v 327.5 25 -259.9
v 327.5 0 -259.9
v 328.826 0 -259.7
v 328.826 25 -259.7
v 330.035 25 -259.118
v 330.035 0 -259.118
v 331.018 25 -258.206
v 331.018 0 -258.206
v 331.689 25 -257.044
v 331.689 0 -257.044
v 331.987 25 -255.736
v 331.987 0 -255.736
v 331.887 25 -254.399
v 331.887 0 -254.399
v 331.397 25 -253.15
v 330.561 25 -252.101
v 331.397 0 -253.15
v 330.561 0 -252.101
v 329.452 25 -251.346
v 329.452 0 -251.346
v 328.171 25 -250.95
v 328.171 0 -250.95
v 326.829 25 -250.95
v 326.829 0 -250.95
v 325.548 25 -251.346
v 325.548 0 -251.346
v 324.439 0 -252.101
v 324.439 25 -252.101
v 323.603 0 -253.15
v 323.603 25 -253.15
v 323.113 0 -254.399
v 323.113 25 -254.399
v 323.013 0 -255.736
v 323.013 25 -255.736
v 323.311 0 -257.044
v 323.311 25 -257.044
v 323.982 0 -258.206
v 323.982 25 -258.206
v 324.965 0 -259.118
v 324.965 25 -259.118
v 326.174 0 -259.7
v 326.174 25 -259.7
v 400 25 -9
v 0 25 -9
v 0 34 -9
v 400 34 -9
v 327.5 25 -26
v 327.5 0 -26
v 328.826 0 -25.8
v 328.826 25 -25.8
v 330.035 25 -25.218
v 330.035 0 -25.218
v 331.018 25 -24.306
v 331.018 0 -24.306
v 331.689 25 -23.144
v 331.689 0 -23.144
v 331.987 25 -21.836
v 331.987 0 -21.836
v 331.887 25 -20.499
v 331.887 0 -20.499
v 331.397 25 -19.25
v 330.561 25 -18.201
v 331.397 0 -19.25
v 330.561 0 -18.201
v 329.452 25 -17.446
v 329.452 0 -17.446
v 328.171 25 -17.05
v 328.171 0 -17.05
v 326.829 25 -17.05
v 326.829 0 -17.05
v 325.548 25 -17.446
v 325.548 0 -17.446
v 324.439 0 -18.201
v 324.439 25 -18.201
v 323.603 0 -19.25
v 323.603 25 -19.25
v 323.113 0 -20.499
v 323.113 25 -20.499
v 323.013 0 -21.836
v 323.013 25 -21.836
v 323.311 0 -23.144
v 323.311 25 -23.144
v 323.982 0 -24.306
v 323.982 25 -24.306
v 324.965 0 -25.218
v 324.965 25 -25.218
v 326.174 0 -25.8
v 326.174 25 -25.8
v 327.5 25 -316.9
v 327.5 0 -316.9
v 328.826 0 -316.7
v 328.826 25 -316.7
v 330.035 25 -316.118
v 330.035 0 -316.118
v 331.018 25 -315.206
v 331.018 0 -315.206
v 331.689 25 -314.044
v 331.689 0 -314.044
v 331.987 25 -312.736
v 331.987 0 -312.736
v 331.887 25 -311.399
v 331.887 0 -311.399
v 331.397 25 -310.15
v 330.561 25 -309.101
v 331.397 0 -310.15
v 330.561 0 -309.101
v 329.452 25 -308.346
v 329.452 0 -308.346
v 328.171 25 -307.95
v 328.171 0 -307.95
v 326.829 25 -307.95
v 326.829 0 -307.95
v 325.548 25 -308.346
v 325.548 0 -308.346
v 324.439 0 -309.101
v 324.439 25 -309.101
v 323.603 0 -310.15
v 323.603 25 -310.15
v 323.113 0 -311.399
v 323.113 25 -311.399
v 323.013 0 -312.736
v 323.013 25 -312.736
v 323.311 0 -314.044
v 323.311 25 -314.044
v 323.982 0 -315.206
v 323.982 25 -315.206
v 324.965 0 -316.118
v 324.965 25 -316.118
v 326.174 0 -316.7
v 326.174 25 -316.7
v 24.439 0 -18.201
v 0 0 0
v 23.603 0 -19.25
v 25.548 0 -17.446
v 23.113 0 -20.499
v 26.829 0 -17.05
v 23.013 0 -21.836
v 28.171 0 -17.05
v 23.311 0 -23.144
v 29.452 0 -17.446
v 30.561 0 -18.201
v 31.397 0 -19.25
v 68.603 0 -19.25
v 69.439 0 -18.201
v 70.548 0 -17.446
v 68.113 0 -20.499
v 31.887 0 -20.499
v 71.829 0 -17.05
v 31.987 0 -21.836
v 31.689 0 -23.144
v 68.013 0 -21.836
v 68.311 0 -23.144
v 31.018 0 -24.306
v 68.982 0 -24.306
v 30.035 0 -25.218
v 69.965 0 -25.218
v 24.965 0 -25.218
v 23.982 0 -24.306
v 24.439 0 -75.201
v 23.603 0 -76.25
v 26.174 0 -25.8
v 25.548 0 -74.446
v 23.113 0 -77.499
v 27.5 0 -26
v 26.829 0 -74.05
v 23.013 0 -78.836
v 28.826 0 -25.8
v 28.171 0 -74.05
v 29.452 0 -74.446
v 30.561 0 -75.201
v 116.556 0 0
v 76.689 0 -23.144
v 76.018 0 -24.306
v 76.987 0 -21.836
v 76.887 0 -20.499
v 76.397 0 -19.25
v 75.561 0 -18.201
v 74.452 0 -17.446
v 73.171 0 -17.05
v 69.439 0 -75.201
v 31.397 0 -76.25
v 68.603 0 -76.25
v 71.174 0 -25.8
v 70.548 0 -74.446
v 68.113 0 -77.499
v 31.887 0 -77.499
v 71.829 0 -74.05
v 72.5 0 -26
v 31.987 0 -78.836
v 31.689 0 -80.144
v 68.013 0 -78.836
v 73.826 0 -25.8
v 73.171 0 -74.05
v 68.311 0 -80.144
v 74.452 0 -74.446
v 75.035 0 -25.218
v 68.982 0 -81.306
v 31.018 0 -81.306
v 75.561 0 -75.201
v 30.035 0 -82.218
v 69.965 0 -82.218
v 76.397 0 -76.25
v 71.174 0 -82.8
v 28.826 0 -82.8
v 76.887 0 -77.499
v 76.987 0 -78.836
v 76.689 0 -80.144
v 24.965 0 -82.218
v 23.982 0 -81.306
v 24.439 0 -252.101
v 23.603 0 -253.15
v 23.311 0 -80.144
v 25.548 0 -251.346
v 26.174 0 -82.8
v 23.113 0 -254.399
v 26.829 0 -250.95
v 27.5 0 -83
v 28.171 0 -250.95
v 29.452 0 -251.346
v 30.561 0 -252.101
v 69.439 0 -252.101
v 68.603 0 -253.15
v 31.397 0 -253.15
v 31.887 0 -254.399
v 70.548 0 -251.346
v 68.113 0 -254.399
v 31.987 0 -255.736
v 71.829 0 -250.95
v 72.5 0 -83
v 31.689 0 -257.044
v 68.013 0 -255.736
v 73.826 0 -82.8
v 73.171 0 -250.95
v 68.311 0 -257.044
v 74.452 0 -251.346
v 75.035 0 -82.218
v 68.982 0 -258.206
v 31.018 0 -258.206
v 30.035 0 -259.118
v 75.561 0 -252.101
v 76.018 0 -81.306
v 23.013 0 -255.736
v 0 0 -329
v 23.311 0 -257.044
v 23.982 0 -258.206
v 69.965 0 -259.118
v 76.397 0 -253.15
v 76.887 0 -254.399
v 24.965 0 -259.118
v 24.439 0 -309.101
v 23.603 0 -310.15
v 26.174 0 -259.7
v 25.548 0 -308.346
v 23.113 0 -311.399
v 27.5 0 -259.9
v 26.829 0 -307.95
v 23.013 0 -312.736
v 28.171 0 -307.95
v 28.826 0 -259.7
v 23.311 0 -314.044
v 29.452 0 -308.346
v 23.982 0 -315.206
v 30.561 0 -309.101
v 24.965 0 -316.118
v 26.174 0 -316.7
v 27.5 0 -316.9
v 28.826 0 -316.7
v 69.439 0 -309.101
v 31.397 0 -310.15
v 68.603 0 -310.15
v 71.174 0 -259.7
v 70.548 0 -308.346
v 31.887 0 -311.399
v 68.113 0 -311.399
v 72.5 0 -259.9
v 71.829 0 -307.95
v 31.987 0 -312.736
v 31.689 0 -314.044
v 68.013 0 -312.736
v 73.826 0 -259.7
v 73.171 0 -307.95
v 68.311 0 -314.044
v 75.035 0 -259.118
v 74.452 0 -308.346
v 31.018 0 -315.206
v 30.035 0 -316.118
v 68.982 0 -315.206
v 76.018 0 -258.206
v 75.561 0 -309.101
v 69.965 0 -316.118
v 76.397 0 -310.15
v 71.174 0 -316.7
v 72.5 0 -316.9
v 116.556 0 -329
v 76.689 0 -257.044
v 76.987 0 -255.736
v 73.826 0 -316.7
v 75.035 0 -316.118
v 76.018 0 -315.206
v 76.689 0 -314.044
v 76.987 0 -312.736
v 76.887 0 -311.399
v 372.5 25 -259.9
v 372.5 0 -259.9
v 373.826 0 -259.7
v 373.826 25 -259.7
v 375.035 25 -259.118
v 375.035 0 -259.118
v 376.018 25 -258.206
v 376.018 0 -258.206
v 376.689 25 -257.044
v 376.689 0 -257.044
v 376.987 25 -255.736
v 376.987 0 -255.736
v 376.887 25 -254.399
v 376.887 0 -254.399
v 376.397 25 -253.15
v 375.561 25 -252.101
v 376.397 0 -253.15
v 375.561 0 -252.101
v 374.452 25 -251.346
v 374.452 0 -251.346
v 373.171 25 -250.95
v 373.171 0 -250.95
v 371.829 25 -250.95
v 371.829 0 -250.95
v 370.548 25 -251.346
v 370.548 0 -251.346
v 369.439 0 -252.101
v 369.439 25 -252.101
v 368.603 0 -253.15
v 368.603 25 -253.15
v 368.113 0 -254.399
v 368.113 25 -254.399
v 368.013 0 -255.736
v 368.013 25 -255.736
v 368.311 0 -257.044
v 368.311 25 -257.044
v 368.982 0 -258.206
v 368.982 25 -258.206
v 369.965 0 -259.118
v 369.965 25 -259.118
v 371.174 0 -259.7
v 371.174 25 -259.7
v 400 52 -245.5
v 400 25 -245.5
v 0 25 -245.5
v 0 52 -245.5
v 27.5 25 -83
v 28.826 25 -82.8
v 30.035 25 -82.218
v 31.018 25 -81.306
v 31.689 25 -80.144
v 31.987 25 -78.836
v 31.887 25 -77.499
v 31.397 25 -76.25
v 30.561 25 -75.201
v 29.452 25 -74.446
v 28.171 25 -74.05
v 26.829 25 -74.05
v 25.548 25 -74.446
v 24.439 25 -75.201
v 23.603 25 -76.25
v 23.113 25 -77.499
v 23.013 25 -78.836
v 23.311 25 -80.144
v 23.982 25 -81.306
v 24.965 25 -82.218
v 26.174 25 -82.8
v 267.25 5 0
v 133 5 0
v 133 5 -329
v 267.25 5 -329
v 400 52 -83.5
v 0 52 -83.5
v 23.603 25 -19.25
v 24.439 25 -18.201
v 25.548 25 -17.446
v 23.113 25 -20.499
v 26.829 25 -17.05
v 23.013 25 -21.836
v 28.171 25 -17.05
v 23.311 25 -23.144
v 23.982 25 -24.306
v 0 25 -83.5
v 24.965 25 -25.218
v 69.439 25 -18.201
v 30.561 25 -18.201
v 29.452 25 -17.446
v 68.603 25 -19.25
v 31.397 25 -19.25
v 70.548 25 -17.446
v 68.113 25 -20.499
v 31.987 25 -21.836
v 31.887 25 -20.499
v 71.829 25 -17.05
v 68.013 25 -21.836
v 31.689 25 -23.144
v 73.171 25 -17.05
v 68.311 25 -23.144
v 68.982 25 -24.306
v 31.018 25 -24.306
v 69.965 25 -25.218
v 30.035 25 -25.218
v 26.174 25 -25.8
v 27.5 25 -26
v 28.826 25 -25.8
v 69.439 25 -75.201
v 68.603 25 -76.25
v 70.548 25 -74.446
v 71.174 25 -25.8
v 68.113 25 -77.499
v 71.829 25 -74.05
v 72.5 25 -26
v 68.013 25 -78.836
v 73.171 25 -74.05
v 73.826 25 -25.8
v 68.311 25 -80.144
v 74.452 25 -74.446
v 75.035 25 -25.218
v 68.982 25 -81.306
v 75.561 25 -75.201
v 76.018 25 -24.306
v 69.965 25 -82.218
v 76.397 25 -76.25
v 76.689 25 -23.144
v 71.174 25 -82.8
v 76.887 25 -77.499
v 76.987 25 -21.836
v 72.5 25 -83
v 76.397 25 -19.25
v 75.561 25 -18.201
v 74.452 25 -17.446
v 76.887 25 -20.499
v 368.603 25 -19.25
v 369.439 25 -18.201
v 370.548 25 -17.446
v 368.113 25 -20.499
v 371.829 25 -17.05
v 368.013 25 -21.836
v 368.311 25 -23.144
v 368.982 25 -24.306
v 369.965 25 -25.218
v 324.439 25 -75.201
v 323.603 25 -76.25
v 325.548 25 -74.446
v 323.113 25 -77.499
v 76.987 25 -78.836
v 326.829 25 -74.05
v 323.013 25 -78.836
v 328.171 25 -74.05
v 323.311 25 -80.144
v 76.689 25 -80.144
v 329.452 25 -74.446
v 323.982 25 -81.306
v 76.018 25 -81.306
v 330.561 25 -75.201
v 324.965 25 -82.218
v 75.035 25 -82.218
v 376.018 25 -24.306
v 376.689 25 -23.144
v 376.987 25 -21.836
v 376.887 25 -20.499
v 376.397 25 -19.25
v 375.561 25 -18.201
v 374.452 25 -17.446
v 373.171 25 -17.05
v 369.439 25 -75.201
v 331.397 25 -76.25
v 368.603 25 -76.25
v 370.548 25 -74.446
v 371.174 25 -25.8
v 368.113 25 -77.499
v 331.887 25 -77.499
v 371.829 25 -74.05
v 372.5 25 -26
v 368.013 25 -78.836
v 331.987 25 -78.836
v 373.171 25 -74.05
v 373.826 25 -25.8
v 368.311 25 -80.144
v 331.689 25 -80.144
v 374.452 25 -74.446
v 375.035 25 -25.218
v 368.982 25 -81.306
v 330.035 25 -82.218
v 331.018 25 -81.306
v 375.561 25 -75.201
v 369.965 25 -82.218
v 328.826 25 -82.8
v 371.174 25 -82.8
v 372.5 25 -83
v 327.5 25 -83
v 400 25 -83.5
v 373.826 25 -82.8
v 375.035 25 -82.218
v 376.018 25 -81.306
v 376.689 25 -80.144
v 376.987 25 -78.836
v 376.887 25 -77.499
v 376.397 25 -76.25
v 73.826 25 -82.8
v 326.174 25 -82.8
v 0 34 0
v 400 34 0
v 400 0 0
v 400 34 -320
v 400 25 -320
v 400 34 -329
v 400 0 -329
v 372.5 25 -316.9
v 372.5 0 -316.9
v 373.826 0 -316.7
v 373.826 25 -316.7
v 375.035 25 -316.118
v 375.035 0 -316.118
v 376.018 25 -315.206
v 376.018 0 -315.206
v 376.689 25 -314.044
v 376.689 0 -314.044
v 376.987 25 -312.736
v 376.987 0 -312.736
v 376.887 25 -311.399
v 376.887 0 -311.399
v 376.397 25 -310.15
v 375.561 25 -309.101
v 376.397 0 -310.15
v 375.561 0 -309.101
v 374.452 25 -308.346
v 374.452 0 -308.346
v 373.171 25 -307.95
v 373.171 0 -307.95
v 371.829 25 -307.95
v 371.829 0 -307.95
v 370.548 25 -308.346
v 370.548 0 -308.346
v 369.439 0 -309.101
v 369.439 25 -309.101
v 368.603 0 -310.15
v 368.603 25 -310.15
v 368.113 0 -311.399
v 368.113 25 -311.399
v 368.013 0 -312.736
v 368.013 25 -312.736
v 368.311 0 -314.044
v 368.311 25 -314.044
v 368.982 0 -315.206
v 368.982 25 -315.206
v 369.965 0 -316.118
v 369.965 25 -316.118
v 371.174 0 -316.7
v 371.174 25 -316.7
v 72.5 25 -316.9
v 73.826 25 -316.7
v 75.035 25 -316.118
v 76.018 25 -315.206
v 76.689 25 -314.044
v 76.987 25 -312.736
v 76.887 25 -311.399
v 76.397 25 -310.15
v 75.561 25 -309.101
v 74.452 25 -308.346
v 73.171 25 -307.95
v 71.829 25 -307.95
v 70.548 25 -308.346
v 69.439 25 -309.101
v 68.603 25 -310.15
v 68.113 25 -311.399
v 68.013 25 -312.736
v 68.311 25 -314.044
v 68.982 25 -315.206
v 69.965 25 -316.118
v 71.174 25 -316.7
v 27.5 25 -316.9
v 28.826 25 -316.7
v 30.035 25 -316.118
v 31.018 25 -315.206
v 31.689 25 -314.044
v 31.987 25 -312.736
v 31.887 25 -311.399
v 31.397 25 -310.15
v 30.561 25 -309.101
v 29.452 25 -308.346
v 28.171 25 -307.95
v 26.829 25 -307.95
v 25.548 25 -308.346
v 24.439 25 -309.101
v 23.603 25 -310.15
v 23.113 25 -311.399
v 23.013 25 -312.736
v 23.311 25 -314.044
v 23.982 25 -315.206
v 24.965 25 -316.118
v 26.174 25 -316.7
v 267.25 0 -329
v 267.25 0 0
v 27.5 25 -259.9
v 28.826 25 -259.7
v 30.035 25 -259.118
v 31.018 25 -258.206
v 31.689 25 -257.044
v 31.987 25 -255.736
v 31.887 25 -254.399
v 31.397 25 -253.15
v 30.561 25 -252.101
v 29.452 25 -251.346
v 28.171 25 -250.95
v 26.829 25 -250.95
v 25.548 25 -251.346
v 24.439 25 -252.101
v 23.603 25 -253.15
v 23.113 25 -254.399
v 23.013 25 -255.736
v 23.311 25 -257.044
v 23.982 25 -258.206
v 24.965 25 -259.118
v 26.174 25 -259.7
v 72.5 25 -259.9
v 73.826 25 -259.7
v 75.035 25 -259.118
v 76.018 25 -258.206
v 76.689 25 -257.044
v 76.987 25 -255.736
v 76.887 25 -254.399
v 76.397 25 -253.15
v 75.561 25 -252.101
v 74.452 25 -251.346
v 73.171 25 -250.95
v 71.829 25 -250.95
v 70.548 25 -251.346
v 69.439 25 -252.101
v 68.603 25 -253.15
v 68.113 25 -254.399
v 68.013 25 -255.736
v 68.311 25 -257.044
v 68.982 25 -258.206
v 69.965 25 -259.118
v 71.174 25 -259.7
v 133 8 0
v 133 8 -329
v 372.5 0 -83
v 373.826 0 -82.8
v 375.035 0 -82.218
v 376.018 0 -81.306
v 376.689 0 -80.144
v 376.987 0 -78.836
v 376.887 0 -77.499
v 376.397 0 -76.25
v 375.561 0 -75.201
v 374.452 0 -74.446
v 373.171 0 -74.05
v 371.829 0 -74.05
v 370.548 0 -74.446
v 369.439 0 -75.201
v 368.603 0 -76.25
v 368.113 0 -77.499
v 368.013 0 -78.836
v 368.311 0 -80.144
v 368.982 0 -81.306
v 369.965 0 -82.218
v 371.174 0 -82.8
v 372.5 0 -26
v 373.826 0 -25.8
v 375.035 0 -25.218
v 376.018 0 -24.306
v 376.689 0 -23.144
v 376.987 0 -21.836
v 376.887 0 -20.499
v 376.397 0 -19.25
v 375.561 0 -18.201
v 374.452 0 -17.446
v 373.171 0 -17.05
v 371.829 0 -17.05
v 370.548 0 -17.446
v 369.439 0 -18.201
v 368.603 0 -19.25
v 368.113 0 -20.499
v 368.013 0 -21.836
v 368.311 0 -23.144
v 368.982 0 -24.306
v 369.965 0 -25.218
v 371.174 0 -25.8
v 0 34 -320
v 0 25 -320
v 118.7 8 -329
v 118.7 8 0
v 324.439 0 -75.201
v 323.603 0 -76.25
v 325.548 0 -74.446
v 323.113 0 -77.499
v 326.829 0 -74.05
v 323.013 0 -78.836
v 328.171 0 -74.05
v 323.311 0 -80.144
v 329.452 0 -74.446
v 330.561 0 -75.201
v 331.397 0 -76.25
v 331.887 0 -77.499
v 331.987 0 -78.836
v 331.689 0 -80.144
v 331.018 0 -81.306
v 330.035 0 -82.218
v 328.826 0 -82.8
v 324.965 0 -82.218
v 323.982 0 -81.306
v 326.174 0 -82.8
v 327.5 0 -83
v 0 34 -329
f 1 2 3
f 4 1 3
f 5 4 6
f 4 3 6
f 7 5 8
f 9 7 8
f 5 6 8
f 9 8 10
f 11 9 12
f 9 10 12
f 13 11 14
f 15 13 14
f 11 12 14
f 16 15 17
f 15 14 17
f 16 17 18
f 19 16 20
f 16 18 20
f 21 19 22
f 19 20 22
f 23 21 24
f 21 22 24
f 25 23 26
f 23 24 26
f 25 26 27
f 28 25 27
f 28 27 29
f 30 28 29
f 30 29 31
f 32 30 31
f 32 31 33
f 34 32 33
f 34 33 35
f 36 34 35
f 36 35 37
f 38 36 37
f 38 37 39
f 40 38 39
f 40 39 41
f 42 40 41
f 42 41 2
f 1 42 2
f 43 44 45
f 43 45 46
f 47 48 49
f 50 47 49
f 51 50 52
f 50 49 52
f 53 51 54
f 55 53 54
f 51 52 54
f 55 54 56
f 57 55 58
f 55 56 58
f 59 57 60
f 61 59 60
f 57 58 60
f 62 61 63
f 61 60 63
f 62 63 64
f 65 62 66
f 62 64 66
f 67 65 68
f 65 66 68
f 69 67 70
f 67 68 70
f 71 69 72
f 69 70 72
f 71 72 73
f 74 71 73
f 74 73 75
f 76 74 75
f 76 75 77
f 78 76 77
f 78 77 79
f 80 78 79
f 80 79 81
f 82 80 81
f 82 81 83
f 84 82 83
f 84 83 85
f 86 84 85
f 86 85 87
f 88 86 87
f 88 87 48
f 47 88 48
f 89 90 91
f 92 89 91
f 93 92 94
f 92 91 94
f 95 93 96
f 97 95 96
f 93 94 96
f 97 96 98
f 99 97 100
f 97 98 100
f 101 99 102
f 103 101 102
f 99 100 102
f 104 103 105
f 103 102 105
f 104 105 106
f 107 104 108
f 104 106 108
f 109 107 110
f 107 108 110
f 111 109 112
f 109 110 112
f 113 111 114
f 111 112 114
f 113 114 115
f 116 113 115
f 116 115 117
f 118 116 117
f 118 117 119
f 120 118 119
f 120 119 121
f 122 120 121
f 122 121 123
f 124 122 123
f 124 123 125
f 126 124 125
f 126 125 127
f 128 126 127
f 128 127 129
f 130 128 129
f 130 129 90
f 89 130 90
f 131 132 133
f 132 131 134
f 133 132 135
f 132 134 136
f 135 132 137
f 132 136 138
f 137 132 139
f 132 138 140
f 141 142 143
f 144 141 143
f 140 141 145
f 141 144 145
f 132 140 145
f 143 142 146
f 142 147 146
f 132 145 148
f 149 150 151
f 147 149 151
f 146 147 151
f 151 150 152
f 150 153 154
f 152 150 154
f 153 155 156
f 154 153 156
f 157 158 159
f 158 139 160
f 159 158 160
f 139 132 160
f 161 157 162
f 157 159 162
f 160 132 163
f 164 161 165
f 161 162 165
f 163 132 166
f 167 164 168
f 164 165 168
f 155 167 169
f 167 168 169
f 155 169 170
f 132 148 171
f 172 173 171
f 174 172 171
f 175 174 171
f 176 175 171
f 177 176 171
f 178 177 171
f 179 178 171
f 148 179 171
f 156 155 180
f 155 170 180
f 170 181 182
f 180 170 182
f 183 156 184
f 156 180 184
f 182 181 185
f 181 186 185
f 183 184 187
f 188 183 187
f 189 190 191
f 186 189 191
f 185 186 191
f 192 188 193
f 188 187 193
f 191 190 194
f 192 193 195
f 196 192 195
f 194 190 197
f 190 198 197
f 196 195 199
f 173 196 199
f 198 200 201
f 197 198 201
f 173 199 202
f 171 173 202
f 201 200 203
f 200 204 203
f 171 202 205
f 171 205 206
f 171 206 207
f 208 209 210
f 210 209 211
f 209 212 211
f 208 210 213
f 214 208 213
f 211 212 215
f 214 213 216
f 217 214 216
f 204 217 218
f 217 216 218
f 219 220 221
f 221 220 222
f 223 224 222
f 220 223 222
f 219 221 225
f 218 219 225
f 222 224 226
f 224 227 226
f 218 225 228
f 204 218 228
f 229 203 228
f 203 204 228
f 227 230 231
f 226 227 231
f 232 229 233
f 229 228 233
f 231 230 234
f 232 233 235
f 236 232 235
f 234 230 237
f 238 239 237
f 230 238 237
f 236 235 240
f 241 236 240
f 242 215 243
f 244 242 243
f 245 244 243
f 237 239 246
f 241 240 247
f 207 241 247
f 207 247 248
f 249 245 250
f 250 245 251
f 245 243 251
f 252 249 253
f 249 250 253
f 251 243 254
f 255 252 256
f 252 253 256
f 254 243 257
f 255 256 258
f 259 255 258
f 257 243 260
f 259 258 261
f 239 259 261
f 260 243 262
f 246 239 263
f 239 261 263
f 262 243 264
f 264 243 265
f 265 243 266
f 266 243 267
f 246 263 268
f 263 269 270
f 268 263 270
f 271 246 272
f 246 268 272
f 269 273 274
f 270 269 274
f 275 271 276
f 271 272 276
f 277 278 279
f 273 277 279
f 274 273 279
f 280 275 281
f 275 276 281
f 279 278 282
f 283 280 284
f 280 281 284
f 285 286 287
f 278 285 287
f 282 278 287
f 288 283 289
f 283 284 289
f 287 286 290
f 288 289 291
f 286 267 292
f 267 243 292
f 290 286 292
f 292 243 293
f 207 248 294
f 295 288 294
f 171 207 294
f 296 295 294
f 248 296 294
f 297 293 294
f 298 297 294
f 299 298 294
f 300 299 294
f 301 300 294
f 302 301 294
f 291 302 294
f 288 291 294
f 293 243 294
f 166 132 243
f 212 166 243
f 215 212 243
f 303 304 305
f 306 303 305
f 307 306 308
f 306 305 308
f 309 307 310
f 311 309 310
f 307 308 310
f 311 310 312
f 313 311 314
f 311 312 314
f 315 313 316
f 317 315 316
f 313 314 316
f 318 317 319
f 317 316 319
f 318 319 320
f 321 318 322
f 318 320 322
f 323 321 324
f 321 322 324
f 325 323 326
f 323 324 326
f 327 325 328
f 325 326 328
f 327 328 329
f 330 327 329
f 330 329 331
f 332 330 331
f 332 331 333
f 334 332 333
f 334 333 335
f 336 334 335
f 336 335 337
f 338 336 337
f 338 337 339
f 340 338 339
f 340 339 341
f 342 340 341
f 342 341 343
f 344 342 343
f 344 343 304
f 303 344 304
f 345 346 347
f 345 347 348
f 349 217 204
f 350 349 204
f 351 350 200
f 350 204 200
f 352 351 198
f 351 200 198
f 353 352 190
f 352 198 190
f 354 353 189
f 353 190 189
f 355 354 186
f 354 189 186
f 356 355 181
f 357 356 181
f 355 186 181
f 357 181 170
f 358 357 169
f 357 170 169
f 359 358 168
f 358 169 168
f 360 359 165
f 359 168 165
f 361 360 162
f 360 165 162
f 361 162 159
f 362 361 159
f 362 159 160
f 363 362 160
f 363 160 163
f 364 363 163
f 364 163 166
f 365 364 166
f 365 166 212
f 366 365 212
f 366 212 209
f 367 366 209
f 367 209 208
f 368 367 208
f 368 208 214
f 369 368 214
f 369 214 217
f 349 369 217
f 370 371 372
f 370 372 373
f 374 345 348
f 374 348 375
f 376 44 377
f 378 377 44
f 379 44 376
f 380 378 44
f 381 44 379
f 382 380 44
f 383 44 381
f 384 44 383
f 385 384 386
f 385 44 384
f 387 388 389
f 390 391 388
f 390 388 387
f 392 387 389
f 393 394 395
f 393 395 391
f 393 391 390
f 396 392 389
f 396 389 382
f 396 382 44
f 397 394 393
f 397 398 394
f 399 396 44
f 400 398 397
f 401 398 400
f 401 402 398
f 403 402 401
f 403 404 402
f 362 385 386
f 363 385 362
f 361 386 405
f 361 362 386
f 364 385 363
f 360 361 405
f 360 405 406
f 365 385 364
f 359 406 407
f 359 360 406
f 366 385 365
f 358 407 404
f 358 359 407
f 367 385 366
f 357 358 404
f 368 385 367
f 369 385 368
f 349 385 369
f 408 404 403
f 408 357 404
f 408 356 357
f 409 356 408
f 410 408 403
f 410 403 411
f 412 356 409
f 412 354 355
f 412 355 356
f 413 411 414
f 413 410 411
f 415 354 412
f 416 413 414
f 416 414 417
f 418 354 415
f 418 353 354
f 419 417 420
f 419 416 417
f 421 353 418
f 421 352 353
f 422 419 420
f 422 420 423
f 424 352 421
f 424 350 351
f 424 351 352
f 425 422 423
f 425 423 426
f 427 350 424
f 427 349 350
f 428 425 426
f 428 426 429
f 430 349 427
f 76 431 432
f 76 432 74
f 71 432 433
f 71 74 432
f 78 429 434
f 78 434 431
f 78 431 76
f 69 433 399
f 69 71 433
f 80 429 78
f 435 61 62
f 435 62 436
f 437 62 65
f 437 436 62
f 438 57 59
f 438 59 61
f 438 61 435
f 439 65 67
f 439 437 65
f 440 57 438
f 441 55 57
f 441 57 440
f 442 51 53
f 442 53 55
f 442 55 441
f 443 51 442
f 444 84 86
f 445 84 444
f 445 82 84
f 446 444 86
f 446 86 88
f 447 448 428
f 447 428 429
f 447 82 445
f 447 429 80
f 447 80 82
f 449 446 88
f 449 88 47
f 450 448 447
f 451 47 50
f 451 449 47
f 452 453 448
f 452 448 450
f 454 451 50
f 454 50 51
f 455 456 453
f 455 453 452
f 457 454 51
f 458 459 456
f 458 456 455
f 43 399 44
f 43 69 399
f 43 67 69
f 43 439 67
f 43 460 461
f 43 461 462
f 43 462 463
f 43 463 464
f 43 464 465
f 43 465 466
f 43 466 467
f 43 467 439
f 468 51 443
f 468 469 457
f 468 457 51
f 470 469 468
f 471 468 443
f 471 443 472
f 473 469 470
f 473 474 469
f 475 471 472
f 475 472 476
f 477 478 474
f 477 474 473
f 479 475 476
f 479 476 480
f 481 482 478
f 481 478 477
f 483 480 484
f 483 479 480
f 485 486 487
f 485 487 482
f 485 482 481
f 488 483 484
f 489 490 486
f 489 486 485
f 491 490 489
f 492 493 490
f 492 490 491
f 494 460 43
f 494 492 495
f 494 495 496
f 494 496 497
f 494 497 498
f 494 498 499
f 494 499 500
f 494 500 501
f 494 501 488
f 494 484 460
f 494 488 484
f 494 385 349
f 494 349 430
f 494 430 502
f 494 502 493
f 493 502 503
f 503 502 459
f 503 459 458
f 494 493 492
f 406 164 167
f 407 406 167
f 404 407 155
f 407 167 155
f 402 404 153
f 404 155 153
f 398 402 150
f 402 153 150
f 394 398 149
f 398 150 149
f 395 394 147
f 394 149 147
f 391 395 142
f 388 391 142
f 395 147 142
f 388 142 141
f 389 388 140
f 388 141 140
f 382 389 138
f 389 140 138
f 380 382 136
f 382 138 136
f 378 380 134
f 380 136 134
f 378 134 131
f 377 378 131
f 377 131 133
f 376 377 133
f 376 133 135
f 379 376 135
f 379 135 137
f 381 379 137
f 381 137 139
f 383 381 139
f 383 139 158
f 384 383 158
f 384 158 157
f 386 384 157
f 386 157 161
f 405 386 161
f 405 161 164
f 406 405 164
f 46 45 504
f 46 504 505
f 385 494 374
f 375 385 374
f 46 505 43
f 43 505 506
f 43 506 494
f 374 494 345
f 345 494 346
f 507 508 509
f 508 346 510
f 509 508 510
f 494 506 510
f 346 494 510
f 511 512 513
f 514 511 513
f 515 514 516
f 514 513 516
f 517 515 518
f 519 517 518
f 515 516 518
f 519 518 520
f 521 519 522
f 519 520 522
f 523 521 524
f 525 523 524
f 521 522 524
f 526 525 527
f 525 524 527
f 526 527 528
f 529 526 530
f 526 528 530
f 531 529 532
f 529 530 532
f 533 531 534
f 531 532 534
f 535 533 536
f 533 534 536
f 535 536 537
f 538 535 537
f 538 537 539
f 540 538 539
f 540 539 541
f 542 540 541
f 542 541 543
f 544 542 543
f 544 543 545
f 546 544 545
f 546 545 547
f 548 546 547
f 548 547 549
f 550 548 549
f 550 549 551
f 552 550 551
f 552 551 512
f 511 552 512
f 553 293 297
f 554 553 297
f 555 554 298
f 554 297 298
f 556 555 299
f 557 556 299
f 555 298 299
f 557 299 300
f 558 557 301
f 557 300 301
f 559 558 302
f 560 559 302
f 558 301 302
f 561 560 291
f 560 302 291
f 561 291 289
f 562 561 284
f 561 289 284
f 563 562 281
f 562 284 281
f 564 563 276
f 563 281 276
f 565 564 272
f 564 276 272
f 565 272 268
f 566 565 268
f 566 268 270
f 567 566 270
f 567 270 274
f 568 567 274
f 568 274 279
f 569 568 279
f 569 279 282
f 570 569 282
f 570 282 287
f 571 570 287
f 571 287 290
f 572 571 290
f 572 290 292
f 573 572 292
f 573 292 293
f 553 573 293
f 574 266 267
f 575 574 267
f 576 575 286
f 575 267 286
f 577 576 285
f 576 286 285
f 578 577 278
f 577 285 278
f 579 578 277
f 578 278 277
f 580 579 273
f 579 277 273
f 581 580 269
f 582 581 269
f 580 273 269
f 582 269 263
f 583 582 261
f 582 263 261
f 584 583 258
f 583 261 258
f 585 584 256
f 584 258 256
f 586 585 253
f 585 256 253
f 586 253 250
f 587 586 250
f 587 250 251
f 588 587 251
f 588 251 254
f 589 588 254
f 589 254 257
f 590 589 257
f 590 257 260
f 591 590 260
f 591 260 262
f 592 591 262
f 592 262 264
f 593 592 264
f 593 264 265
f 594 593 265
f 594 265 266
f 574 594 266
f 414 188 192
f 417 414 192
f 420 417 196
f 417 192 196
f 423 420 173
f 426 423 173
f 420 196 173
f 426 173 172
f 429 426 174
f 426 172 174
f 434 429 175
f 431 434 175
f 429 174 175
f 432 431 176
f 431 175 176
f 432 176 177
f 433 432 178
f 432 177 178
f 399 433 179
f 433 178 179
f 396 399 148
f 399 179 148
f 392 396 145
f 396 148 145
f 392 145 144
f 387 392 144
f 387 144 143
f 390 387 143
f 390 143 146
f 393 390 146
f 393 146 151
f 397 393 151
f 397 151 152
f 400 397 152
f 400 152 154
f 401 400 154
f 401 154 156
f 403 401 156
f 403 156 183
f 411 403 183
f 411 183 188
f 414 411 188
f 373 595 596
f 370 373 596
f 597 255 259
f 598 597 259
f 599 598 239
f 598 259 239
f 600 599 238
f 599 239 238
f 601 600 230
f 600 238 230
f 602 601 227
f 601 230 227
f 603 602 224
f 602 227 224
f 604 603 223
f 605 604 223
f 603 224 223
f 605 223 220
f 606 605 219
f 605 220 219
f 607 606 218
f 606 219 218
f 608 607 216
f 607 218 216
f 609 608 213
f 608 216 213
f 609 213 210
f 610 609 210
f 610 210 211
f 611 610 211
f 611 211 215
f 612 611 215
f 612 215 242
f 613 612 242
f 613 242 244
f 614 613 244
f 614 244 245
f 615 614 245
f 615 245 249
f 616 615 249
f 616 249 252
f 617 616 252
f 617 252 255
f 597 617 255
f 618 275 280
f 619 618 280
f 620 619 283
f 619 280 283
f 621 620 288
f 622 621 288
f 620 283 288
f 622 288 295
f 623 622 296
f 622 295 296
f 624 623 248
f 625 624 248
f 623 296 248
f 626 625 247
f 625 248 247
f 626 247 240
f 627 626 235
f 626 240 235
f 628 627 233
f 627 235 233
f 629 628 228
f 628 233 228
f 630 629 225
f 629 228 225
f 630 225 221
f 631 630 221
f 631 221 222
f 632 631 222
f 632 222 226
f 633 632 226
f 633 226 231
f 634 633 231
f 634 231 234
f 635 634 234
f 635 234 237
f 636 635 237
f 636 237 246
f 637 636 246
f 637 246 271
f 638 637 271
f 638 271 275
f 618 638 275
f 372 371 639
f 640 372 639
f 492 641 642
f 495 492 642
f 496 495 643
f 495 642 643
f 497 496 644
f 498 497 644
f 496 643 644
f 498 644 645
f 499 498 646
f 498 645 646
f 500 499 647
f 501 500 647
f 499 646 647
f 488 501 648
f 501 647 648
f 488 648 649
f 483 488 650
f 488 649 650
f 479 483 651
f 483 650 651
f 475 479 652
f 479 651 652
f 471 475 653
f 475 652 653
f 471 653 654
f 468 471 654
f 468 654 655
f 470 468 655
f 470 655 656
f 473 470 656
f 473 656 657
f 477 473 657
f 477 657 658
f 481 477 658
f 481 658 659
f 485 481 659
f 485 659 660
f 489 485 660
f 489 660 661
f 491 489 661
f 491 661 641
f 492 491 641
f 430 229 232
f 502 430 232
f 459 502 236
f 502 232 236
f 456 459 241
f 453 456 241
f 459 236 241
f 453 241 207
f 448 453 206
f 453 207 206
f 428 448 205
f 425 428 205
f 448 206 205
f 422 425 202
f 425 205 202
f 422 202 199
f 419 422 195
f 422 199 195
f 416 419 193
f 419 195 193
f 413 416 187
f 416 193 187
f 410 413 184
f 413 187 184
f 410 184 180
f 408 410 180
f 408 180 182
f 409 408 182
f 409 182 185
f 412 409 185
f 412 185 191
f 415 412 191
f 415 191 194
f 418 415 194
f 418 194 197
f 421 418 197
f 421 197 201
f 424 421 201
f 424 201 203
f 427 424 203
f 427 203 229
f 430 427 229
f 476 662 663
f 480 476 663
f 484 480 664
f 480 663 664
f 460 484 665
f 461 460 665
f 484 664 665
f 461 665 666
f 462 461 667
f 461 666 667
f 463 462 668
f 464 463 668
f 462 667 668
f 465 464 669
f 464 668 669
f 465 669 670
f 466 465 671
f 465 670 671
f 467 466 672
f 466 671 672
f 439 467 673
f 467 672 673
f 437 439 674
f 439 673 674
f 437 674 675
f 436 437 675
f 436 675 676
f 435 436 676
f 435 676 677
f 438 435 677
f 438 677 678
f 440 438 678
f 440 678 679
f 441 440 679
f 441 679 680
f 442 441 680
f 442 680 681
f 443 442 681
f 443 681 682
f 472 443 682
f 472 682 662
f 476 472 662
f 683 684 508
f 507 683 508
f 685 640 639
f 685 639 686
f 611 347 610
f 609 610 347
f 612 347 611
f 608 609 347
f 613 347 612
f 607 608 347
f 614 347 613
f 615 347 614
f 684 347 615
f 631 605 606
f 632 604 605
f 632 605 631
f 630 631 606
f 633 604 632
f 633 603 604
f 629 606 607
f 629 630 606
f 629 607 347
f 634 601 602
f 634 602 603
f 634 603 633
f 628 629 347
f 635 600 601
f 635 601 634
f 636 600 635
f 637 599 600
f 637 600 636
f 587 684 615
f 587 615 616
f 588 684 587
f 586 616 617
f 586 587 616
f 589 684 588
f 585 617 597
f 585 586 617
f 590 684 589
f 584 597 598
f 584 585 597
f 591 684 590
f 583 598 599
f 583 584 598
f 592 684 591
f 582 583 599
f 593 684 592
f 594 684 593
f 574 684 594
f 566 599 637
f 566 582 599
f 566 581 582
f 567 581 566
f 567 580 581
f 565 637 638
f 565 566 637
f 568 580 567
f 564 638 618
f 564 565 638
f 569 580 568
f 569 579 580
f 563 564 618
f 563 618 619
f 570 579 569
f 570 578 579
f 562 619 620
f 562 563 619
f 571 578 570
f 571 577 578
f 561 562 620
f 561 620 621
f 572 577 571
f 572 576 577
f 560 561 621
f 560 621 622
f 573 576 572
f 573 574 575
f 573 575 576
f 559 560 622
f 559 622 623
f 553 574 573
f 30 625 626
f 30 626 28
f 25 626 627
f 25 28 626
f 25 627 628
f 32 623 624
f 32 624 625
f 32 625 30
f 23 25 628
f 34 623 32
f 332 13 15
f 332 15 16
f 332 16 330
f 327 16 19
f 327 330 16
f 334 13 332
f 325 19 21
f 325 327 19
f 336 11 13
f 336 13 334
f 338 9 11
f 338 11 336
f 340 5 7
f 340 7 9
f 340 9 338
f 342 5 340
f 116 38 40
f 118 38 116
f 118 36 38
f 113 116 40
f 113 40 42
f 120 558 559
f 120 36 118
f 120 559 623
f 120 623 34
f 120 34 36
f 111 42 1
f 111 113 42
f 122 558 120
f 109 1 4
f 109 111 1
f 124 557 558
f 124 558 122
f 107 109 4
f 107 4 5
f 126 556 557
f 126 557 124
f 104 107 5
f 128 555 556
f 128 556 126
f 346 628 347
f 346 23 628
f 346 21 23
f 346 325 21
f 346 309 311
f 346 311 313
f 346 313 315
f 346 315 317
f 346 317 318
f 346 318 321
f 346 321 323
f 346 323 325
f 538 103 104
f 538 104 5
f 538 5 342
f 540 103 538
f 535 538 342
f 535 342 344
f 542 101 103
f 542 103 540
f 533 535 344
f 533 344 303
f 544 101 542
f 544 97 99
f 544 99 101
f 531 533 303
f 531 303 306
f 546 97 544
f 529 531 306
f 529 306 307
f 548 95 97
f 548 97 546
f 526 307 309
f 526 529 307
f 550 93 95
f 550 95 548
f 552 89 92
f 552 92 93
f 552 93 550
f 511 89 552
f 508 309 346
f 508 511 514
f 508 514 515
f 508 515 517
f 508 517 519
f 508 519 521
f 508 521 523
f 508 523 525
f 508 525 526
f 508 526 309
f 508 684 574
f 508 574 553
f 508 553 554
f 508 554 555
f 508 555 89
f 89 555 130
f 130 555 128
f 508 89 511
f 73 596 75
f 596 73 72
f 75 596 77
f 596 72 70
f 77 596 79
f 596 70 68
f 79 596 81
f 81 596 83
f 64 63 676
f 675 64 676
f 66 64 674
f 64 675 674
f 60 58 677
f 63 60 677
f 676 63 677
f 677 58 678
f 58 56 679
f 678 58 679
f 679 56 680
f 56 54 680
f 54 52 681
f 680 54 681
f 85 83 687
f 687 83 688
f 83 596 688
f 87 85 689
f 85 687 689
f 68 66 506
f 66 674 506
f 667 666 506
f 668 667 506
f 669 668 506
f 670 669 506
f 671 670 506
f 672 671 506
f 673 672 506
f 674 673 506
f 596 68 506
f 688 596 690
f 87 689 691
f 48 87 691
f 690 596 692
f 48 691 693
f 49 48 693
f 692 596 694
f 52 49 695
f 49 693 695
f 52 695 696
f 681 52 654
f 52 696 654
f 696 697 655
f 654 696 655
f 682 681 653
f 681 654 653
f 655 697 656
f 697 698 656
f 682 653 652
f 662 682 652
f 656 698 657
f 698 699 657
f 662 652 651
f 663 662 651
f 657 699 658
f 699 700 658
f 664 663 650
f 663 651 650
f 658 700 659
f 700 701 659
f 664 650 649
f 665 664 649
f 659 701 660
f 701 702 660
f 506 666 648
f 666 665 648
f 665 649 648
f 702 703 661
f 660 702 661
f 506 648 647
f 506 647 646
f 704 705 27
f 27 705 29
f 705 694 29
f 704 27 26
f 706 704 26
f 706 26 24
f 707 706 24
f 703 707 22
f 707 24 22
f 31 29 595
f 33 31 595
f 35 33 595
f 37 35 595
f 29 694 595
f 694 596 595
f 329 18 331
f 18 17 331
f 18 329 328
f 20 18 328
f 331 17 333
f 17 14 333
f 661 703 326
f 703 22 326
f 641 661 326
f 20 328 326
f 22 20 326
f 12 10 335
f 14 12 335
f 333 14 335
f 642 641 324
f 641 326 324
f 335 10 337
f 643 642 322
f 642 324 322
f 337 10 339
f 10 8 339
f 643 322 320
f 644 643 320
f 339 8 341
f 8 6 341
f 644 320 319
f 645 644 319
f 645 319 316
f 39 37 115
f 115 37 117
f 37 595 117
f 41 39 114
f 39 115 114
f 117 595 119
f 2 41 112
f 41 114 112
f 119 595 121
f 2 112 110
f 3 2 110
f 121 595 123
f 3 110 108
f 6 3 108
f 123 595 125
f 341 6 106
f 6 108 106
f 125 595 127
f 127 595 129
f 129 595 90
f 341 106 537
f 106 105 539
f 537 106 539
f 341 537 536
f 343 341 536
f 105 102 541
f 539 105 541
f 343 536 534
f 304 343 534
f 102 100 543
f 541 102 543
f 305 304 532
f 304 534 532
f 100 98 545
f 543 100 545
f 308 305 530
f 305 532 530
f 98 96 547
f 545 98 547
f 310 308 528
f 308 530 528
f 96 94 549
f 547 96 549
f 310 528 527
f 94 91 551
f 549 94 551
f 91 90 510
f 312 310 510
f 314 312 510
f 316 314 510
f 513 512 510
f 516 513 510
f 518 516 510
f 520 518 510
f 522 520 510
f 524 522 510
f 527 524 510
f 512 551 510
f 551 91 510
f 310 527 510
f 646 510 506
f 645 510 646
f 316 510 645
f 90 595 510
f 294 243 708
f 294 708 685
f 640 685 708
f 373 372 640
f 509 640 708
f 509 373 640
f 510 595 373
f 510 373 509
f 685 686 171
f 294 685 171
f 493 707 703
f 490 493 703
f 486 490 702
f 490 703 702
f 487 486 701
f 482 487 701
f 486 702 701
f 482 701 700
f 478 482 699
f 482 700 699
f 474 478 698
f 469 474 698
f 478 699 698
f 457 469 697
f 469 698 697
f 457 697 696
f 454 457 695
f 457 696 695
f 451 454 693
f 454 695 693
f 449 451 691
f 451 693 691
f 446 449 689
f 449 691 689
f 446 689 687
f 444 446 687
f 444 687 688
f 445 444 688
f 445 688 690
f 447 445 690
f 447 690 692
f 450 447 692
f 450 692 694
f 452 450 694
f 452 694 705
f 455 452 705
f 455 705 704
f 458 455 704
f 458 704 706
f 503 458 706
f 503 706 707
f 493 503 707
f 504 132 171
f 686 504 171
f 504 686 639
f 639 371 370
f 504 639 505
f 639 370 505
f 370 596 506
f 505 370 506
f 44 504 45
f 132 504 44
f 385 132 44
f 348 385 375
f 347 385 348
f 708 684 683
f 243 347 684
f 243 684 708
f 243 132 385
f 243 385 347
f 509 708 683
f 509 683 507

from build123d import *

# Parameters (mm, degrees)
SKETCH_1_W          = 400
SKETCH_1_H          = 329
EXTRUDE_2_DEPTH     = 25
SKETCH_2_W          = 400
SKETCH_2_H          = 9
EXTRUDE_3_DEPTH     = 9
SKETCH_3_W          = 81
SKETCH_3_H          = 27
EXTRUDE_4_DEPTH     = 400
SKETCH_4_W          = 67.25
SKETCH_4_H          = 5
CUT_EXTRUDE_1_DEPTH = 5
CUT_EXTRUDE_2_DEPTH = 400
CUT_EXTRUDE_3_DEPTH = 400
SKETCH_8_R          = 4.5
CUT_EXTRUDE_4_DEPTH = 400


with BuildPart() as part:
    # 草图1 → 凸台-拉伸2 (new body)
    with BuildSketch(Plane(origin=(0, 0, 0), x_dir=(1, 0, 0), z_dir=(0, 1, 0))):
        with Locations((200, 164.5)):
            Rectangle(SKETCH_1_W, SKETCH_1_H)
    extrude(amount=EXTRUDE_2_DEPTH)

    # 草图2 → 凸台-拉伸3 (add)
    with BuildSketch(Plane(origin=(0, 25, 0), x_dir=(1, 0, 0), z_dir=(0, 1, 0))):
        with Locations((200, 324.5)):
            Rectangle(SKETCH_2_W, SKETCH_2_H)
        with Locations((200, 4.5)):
            Rectangle(SKETCH_2_W, SKETCH_2_H)
    extrude(amount=EXTRUDE_3_DEPTH)

    # 草图3 → 凸台-拉伸4 (add)
    with BuildSketch(Plane(origin=(400, 0, 0), x_dir=(0, 0, -1), z_dir=(1, 0, 0))):
        with Locations((205, 38.5)):
            Rectangle(SKETCH_3_W, SKETCH_3_H)
        with Locations((124, 38.5)):
            Rectangle(SKETCH_3_W, SKETCH_3_H)
    extrude(amount=-EXTRUDE_4_DEPTH)

    # 草图4 → 切除-拉伸1 (cut)
    with BuildSketch(Plane.XZ):
        Polygon((200, -5), (200, 0), (133, 0), (133, -329), (267.25, -329), (267.25, -5), align=None)
        with Locations((233.625, -2.5)):
            Rectangle(SKETCH_4_W, SKETCH_4_H)
    extrude(amount=-CUT_EXTRUDE_1_DEPTH, mode=Mode.SUBTRACT)

    # 草图5 → 切除-拉伸2 (cut)
    with BuildSketch(Plane.XY):
        Polygon((133, 5), (133, 8), (118.7, 8), (118.7, 0), (133, 0), align=None)
    extrude(amount=-CUT_EXTRUDE_2_DEPTH, mode=Mode.SUBTRACT)

    # 草图6 → 切除-拉伸3 (cut)
    with BuildSketch(Plane.XY):
        Polygon((118.7, 8), (116.556406461, 0), (118.7, 0), align=None)
    extrude(amount=-CUT_EXTRUDE_3_DEPTH, mode=Mode.SUBTRACT)

    # 草图8 → 切除-拉伸4 (cut)
    with BuildSketch(Plane.XZ):
        with Locations(Location((372.5, -312.4, 0), (0, 0, 270))):
            Circle(SKETCH_8_R)
        with Locations(Location((327.5, -312.4, 0), (0, 0, 270))):
            Circle(SKETCH_8_R)
        with Locations(Location((372.5, -255.4, 0), (0, 0, 270))):
            Circle(SKETCH_8_R)
        with Locations(Location((327.5, -255.4, 0), (0, 0, 270))):
            Circle(SKETCH_8_R)
        with Locations(Location((372.5, -78.5, 0), (0, 0, 270))):
            Circle(SKETCH_8_R)
        with Locations(Location((327.5, -78.5, 0), (0, 0, 270))):
            Circle(SKETCH_8_R)
        with Locations(Location((372.5, -21.5, 0), (0, 0, 270))):
            Circle(SKETCH_8_R)
        with Locations(Location((327.5, -21.5, 0), (0, 0, 270))):
            Circle(SKETCH_8_R)
        with Locations(Location((27.5, -21.5, 0), (0, 0, 270))):
            Circle(SKETCH_8_R)
        with Locations(Location((72.5, -21.5, 0), (0, 0, 270))):
            Circle(SKETCH_8_R)
        with Locations(Location((72.5, -78.5, 0), (0, 0, 270))):
            Circle(SKETCH_8_R)
        with Locations(Location((27.5, -78.5, 0), (0, 0, 270))):
            Circle(SKETCH_8_R)
        with Locations(Location((72.5, -312.4, 0), (0, 0, 270))):
            Circle(SKETCH_8_R)
        with Locations(Location((27.5, -312.4, 0), (0, 0, 270))):
            Circle(SKETCH_8_R)
        with Locations(Location((27.5, -255.4, 0), (0, 0, 270))):
            Circle(SKETCH_8_R)
        with Locations(Location((72.5, -255.4, 0), (0, 0, 270))):
            Circle(SKETCH_8_R)
    extrude(amount=-CUT_EXTRUDE_4_DEPTH, mode=Mode.SUBTRACT)


solid = part.part
